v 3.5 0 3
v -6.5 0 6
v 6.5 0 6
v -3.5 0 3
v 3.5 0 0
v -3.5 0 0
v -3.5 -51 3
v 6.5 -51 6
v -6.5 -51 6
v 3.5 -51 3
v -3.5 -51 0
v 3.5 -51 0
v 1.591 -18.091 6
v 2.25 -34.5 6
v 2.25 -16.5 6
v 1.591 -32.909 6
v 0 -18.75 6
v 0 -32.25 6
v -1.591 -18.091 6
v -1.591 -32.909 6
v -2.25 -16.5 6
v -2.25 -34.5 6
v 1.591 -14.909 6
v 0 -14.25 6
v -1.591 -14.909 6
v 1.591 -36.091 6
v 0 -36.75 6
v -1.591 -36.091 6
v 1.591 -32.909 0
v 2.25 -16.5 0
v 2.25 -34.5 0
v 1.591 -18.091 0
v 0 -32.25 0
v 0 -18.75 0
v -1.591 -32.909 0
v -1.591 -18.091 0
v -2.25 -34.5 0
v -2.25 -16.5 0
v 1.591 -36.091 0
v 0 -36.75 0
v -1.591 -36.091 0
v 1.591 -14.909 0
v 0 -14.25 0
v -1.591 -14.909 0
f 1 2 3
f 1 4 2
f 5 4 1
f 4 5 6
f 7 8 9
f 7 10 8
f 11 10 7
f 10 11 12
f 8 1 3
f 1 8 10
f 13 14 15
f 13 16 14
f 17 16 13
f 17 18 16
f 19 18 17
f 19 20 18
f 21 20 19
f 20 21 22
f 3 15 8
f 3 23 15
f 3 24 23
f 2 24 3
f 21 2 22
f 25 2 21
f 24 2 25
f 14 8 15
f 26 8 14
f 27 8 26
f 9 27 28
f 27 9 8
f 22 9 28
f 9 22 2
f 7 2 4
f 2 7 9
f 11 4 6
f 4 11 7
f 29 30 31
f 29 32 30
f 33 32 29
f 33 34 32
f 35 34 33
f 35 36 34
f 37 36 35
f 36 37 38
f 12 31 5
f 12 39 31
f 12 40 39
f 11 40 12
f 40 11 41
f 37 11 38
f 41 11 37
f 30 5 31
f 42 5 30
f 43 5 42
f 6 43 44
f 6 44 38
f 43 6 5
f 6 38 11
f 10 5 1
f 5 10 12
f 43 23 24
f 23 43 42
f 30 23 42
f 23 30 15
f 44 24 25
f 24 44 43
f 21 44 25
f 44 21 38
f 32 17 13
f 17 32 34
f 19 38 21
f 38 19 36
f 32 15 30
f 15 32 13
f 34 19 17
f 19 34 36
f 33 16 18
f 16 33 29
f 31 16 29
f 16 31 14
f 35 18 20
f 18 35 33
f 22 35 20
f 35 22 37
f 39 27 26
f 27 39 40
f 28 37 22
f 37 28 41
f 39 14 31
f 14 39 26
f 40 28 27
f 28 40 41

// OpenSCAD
dovetailWidth = 13;
dovetailHeight = 3;
extraHeight = 3;
length = 51;
holeSpacing = 18;
holeDiameter = 4.5;


module dummy() {}

extraWidth = dovetailWidth - 2*dovetailHeight;

//translate([0,0,extraHeight+dovetailHeight])
//rotate([0,180,0])
render(convexity=2)
difference() {
rotate([90,0,0])
linear_extrude(height=length)
polygon([ [-extraWidth/2,0], [-extraWidth/2,extraHeight], [-extraWidth/2-dovetailHeight,extraHeight+dovetailHeight], [extraWidth/2+dovetailHeight,extraHeight+dovetailHeight], [extraWidth/2,extraHeight], [extraWidth/2,0]]);
translate([0,-length/2+holeSpacing/2,-1]) cylinder(d=holeDiameter,h=extraHeight+dovetailHeight+2);
translate([0,-length/2-holeSpacing/2,-1]) cylinder(d=holeDiameter,h=extraHeight+dovetailHeight+2);
}
